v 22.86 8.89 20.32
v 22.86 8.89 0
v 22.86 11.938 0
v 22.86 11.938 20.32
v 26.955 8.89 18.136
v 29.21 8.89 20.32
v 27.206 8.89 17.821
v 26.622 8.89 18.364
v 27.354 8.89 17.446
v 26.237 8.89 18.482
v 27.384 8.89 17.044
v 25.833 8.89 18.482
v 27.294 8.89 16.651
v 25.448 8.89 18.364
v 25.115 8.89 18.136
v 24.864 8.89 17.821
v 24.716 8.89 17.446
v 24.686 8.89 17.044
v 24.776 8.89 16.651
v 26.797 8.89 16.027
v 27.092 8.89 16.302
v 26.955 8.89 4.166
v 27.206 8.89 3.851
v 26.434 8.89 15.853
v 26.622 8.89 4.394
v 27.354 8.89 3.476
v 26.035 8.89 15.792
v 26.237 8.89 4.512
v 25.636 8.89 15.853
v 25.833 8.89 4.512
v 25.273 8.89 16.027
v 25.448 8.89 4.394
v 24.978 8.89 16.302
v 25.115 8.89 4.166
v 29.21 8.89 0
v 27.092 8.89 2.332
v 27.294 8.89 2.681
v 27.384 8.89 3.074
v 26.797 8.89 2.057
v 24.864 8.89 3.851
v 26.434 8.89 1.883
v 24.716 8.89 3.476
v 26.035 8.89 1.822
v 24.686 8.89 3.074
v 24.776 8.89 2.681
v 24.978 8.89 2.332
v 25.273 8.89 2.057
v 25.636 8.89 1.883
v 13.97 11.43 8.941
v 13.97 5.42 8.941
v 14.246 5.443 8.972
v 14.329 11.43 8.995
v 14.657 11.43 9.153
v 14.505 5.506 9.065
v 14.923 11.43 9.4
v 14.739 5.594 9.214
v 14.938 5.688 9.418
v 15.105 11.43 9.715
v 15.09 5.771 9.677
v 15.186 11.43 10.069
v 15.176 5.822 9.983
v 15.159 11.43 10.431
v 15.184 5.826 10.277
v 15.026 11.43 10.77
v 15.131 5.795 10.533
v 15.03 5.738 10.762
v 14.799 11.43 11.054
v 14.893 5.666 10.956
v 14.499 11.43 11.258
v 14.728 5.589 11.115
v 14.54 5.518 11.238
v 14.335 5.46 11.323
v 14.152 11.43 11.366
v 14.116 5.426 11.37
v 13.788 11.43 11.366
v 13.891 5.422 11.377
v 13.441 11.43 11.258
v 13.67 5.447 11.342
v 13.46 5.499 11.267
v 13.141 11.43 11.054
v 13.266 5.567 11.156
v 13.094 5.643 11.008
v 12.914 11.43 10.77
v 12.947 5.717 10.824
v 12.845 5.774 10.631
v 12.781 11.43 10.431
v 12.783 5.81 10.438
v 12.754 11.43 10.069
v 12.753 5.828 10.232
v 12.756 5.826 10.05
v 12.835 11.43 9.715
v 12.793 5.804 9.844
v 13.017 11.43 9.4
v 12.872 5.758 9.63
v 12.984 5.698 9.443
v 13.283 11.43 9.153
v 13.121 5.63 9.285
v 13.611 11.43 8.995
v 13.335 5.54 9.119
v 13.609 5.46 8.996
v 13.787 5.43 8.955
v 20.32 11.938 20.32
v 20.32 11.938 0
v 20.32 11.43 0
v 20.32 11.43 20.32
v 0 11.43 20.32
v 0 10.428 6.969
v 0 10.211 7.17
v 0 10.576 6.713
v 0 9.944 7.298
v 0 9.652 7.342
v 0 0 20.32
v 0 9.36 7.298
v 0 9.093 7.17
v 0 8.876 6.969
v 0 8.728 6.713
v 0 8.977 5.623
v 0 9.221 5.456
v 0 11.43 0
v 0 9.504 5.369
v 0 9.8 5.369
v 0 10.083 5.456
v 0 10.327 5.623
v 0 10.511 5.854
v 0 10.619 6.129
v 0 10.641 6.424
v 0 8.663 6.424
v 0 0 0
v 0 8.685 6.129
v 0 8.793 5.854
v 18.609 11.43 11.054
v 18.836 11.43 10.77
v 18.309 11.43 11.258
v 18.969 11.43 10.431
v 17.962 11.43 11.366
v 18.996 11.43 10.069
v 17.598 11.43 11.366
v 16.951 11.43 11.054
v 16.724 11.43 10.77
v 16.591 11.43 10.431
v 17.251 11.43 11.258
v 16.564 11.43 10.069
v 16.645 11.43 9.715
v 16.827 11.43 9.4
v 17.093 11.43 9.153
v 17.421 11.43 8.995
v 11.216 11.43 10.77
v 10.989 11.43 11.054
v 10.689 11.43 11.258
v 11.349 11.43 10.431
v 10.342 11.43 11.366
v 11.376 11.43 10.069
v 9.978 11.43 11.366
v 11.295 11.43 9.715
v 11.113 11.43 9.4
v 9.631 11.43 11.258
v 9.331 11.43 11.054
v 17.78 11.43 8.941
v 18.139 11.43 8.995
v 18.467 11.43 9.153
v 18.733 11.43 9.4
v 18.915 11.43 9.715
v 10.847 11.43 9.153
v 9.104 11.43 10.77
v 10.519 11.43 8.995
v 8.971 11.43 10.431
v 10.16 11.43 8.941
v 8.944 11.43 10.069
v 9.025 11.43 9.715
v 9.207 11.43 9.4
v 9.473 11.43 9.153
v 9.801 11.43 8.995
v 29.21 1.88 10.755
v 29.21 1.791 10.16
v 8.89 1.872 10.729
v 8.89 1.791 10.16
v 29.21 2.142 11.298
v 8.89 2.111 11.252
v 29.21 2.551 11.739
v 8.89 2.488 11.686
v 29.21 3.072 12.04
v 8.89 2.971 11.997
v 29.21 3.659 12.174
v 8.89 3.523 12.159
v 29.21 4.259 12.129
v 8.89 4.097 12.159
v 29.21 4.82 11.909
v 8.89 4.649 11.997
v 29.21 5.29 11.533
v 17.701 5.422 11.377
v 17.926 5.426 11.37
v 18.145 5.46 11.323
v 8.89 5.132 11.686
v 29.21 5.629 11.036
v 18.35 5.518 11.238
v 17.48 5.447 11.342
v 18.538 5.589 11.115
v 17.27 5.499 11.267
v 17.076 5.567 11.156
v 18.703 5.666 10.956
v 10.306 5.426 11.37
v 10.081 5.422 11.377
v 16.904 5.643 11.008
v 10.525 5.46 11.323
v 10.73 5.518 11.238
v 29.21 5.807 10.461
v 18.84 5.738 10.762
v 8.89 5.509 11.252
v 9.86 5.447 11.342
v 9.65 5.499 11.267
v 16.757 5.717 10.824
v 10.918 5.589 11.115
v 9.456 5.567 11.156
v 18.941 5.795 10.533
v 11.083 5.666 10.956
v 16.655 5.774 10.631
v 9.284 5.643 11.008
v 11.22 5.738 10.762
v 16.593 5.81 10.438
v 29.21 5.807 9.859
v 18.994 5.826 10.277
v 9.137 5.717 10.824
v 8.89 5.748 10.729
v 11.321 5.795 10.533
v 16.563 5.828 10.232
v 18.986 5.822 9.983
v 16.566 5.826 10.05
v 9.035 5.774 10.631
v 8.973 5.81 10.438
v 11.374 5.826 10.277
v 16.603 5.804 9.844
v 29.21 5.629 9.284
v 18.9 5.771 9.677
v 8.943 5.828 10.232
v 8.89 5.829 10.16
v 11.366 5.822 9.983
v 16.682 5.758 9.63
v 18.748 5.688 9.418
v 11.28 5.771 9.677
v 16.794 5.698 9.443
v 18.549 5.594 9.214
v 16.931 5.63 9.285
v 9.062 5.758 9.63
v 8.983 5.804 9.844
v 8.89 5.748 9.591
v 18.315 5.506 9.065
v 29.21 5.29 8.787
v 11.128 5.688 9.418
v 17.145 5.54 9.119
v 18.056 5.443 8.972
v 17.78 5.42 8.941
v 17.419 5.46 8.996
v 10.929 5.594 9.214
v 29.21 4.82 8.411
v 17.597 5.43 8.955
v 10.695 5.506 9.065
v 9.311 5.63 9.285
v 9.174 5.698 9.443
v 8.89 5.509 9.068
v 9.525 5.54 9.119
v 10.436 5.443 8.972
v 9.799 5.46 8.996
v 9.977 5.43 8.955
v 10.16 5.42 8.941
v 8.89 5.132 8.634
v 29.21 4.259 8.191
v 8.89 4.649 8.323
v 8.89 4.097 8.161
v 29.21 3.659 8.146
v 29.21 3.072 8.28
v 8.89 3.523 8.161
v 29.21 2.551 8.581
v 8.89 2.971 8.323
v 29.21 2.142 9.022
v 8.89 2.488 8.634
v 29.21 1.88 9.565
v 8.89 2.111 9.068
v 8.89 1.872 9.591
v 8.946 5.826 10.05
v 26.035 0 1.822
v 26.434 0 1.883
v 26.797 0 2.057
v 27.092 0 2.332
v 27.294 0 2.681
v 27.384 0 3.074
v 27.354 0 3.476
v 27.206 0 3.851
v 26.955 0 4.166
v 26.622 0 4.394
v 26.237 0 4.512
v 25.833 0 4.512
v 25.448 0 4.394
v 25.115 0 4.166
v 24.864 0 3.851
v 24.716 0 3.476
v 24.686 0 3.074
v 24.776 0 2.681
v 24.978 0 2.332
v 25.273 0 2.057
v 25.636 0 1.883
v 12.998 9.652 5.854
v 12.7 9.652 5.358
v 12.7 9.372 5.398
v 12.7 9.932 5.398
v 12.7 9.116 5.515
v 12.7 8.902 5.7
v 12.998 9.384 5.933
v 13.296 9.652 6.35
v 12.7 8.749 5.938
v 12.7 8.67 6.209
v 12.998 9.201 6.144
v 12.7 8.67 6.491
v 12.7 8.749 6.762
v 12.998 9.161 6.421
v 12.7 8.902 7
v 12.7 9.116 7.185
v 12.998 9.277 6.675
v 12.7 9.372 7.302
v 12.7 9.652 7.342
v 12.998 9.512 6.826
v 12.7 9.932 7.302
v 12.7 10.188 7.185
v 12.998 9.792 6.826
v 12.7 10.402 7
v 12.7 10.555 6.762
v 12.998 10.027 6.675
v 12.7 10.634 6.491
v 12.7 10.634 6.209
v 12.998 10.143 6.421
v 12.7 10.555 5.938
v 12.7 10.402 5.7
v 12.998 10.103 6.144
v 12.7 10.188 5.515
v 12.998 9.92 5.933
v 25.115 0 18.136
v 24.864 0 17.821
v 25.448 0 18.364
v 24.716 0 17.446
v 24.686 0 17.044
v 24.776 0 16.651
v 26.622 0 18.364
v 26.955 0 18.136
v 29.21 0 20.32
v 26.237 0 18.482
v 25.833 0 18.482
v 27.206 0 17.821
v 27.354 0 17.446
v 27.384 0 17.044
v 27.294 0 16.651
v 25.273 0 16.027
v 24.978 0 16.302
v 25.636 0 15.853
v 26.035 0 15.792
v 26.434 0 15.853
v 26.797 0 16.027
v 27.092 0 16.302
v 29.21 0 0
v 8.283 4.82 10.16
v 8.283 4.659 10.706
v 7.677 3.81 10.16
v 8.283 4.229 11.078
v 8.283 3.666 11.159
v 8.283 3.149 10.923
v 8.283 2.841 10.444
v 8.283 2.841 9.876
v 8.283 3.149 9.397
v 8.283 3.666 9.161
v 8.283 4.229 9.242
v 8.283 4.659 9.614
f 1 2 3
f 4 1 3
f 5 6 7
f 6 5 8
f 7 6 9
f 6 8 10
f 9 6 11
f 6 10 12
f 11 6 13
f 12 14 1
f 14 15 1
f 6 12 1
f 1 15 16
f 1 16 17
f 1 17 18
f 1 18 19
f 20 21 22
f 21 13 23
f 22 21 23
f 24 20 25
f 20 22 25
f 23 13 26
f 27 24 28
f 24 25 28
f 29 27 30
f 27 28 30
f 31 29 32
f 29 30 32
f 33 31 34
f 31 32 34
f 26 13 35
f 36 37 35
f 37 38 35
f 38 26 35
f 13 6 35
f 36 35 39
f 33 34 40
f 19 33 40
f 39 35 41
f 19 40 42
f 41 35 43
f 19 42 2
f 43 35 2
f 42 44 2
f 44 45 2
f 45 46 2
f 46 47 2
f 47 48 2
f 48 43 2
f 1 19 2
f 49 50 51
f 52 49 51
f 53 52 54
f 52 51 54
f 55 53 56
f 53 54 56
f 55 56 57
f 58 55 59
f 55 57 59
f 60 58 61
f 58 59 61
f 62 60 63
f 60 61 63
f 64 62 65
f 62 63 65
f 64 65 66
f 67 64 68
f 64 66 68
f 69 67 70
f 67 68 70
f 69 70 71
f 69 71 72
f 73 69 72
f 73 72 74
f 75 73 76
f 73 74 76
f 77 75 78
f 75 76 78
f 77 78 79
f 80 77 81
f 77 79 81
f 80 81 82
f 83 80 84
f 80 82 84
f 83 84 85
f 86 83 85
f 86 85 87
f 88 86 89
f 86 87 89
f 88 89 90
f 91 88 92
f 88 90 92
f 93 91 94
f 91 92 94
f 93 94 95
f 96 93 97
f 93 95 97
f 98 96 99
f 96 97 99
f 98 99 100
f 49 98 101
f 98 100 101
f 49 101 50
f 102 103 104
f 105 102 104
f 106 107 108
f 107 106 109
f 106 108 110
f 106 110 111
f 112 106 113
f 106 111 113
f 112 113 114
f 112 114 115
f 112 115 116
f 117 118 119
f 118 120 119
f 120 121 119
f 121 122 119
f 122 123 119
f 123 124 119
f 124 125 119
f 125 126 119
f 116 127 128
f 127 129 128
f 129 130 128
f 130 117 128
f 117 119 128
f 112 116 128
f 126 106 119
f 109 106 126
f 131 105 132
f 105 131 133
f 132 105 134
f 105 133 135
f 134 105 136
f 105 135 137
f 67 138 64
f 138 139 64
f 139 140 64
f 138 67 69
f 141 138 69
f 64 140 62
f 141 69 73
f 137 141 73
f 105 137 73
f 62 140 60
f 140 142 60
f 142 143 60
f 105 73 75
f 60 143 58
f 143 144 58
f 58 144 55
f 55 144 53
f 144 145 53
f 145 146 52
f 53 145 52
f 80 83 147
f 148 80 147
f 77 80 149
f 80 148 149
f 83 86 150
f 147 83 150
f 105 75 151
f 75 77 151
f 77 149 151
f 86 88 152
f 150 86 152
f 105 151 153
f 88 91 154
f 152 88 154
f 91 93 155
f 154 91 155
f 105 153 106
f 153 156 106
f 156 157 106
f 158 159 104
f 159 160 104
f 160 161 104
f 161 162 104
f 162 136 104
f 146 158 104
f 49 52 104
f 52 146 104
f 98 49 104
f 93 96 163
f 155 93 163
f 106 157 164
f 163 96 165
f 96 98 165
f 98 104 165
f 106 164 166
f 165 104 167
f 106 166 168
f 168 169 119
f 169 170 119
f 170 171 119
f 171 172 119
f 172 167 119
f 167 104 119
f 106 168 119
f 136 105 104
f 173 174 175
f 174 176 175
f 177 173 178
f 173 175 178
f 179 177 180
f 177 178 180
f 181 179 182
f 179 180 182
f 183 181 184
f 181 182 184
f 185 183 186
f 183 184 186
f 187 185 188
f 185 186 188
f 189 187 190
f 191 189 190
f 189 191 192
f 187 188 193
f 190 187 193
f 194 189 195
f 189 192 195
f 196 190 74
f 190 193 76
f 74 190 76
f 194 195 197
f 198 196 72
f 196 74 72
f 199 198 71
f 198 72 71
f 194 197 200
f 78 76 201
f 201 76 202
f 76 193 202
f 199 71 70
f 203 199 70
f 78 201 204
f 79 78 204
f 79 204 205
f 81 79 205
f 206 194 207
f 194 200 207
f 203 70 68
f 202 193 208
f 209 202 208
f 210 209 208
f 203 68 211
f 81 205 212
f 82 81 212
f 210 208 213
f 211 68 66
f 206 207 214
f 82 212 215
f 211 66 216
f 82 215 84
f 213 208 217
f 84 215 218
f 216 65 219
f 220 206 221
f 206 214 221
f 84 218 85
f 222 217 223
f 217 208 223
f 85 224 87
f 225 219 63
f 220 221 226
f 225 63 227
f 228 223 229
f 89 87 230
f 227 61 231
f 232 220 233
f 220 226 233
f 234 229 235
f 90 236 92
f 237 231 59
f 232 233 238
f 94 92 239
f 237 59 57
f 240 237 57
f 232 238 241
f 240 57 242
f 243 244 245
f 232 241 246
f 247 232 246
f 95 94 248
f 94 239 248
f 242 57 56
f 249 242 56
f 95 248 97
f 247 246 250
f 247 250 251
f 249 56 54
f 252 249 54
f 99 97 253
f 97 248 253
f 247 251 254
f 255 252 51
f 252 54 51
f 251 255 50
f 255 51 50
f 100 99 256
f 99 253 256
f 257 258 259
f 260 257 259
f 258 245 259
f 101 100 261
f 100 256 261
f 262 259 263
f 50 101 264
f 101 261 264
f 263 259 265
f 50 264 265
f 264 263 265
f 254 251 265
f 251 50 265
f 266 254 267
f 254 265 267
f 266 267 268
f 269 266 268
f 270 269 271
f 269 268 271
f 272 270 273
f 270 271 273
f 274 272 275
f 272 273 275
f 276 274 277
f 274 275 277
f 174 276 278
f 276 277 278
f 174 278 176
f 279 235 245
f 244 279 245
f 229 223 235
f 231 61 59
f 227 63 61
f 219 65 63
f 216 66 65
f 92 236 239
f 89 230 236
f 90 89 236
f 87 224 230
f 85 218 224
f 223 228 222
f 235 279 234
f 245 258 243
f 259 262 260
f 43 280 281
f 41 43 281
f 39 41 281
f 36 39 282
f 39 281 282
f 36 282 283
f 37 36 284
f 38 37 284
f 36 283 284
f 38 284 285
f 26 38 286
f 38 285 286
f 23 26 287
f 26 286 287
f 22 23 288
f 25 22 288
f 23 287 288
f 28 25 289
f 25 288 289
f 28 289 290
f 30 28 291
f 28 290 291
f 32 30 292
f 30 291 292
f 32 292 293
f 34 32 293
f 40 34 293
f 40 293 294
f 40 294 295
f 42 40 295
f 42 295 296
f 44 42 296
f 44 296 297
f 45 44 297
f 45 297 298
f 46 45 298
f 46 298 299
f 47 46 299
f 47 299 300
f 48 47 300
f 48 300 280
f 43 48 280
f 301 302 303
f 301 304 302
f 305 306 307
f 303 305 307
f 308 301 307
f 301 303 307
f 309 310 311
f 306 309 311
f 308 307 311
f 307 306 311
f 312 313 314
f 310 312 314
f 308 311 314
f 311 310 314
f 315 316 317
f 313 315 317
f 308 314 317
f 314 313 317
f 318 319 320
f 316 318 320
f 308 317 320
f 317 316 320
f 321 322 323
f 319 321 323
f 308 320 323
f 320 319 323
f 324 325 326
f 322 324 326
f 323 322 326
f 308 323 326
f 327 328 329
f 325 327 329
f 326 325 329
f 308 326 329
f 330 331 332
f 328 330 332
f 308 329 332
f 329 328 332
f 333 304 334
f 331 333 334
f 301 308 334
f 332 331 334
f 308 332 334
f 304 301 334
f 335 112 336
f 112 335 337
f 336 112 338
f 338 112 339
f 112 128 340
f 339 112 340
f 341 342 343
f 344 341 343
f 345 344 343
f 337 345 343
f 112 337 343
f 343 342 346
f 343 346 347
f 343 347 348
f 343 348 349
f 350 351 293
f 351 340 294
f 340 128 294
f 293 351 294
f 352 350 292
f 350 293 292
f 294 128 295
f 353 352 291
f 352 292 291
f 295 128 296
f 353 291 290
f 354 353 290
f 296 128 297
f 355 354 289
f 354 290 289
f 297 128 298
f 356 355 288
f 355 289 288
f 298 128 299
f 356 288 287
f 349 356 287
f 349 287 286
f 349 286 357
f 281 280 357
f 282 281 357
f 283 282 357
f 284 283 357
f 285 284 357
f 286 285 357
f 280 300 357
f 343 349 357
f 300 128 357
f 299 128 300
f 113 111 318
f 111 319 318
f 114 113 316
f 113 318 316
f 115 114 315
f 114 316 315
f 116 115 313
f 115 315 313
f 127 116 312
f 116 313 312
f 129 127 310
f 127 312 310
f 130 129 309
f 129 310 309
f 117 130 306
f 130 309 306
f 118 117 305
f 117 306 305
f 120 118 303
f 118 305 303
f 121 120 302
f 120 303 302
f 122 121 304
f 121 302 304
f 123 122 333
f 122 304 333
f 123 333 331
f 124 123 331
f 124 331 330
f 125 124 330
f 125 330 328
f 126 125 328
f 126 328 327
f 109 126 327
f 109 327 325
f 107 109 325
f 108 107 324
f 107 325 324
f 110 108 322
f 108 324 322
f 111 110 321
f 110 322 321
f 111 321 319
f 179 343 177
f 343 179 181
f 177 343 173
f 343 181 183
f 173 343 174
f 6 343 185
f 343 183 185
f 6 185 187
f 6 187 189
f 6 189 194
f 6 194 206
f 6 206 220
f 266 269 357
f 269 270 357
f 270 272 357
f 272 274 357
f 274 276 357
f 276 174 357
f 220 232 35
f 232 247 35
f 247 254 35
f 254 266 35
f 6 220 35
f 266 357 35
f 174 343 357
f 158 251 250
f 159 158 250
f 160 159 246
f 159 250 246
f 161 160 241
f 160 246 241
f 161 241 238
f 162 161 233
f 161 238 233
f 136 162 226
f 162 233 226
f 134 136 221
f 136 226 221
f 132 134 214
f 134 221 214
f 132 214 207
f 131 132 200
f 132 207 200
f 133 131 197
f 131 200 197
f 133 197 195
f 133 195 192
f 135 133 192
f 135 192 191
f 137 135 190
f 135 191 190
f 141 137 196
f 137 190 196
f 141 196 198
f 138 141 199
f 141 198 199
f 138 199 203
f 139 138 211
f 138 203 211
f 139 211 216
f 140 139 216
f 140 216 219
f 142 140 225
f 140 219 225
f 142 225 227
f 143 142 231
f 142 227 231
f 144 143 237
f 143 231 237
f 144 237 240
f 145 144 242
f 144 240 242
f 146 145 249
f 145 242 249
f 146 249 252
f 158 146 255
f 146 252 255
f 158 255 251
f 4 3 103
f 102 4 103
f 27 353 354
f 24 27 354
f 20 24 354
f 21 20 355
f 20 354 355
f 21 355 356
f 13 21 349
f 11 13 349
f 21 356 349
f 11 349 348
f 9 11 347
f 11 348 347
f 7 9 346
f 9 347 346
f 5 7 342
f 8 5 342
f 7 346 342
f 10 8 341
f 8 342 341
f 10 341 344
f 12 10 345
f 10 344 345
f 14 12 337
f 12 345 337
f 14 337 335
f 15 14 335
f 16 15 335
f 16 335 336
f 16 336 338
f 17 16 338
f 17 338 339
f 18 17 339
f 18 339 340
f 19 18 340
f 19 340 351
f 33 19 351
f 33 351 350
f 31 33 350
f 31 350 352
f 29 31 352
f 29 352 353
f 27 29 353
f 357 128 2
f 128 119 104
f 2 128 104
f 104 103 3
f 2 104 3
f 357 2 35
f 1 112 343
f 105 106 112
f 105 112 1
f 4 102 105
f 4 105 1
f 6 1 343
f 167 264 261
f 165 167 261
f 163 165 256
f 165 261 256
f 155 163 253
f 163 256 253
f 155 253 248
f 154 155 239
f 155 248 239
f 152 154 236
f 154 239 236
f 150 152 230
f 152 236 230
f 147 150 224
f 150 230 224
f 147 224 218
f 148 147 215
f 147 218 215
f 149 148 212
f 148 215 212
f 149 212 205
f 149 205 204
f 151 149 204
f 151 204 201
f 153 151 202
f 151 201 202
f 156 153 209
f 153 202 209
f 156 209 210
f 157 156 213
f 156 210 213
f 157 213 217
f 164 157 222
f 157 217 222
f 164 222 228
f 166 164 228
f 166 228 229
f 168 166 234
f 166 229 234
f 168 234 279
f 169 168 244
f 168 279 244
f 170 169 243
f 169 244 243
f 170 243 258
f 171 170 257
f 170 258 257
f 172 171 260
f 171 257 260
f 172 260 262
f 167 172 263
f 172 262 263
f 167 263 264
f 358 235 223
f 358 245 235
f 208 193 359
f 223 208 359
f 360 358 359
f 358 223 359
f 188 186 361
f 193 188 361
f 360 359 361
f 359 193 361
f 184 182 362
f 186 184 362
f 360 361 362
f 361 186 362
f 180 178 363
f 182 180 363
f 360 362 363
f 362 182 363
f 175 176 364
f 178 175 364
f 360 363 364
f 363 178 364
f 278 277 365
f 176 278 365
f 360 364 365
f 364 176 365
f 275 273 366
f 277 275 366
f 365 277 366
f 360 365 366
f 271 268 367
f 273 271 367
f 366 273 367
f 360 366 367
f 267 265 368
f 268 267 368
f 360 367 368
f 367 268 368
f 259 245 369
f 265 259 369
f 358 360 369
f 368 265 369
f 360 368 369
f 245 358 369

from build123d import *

# Parameters (mm, degrees)
BOSS_EXTRUDE1_DEPTH                 = 20.32
F_2_CLEARANCE_HOLE1_D               = 2.4384
F_2_CLEARANCE_HOLE1_DEPTH           = 7.62
F_2_CLEARANCE_HOLE1_TIP             = 0.732569267
TAP_DRILL_FOR_10_32_TAP1_D          = 4.0386
TAP_DRILL_FOR_10_32_TAP1_DEPTH      = 20.32
TAP_DRILL_FOR_10_32_TAP1_TIP        = 1.213317848
F_5_64_0_07813_DIAMETER_HOLE1_D     = 1.984502
F_5_64_0_07813_DIAMETER_HOLE1_DEPTH = 12.7
F_5_64_0_07813_DIAMETER_HOLE1_TIP   = 0.59620455
TAP_DRILL_FOR_6_32_TAP1_D           = 2.7051


with BuildPart() as part:
    # Sketch1 → Boss-Extrude1 (new body)
    with BuildSketch(Plane.XY):
        Polygon((0, 0), (25.4, 0), (29.21, 0), (29.21, 8.89), (22.86, 8.89), (22.86, 11.938), (20.32, 11.938), (20.32, 11.43), (0, 11.43), align=None)
    extrude(amount=BOSS_EXTRUDE1_DEPTH)

    # #2 Clearance Hole1
    with Locations(Plane(origin=(17.78, 11.43, 10.16), x_dir=(0, 0, 1), z_dir=(0, 1, 0))):
        with Locations((0, 0), (0, -3.81), (0, -7.62)):
            Hole(F_2_CLEARANCE_HOLE1_D / 2, depth=F_2_CLEARANCE_HOLE1_DEPTH)
            with Locations((0, 0, -(F_2_CLEARANCE_HOLE1_DEPTH + F_2_CLEARANCE_HOLE1_TIP / 2))):  # 118° drill point
                Cone(0, F_2_CLEARANCE_HOLE1_D / 2, F_2_CLEARANCE_HOLE1_TIP, mode=Mode.SUBTRACT)

    # Tap Drill for #10-32 Tap1
    with Locations(Plane(origin=(29.21, 3.81, 10.16), x_dir=(0, 1, 0), z_dir=(1, 0, 0))):
        with Locations((0, 0)):
            Hole(TAP_DRILL_FOR_10_32_TAP1_D / 2, depth=TAP_DRILL_FOR_10_32_TAP1_DEPTH)
            with Locations((0, 0, -(TAP_DRILL_FOR_10_32_TAP1_DEPTH + TAP_DRILL_FOR_10_32_TAP1_TIP / 2))):  # 118° drill point
                Cone(0, TAP_DRILL_FOR_10_32_TAP1_D / 2, TAP_DRILL_FOR_10_32_TAP1_TIP, mode=Mode.SUBTRACT)

    # 5/64 (0.07813) Diameter Hole1
    with Locations(Plane(origin=(0, 9.652, 6.35), x_dir=(0, 0, -1), z_dir=(-1, 0, 0))):
        with Locations((0, 0)):
            Hole(F_5_64_0_07813_DIAMETER_HOLE1_D / 2, depth=F_5_64_0_07813_DIAMETER_HOLE1_DEPTH)
            with Locations((0, 0, -(F_5_64_0_07813_DIAMETER_HOLE1_DEPTH + F_5_64_0_07813_DIAMETER_HOLE1_TIP / 2))):  # 118° drill point
                Cone(0, F_5_64_0_07813_DIAMETER_HOLE1_D / 2, F_5_64_0_07813_DIAMETER_HOLE1_TIP, mode=Mode.SUBTRACT)

    # Tap Drill for #6-32 Tap1 (through all)
    with Locations(Plane(origin=(26.035, 8.89, 17.145), x_dir=(0, 0, 1), z_dir=(0, 1, 0))):
        with Locations((0, 0), (-13.97, 0)):
            Hole(TAP_DRILL_FOR_6_32_TAP1_D / 2)


solid = part.part
